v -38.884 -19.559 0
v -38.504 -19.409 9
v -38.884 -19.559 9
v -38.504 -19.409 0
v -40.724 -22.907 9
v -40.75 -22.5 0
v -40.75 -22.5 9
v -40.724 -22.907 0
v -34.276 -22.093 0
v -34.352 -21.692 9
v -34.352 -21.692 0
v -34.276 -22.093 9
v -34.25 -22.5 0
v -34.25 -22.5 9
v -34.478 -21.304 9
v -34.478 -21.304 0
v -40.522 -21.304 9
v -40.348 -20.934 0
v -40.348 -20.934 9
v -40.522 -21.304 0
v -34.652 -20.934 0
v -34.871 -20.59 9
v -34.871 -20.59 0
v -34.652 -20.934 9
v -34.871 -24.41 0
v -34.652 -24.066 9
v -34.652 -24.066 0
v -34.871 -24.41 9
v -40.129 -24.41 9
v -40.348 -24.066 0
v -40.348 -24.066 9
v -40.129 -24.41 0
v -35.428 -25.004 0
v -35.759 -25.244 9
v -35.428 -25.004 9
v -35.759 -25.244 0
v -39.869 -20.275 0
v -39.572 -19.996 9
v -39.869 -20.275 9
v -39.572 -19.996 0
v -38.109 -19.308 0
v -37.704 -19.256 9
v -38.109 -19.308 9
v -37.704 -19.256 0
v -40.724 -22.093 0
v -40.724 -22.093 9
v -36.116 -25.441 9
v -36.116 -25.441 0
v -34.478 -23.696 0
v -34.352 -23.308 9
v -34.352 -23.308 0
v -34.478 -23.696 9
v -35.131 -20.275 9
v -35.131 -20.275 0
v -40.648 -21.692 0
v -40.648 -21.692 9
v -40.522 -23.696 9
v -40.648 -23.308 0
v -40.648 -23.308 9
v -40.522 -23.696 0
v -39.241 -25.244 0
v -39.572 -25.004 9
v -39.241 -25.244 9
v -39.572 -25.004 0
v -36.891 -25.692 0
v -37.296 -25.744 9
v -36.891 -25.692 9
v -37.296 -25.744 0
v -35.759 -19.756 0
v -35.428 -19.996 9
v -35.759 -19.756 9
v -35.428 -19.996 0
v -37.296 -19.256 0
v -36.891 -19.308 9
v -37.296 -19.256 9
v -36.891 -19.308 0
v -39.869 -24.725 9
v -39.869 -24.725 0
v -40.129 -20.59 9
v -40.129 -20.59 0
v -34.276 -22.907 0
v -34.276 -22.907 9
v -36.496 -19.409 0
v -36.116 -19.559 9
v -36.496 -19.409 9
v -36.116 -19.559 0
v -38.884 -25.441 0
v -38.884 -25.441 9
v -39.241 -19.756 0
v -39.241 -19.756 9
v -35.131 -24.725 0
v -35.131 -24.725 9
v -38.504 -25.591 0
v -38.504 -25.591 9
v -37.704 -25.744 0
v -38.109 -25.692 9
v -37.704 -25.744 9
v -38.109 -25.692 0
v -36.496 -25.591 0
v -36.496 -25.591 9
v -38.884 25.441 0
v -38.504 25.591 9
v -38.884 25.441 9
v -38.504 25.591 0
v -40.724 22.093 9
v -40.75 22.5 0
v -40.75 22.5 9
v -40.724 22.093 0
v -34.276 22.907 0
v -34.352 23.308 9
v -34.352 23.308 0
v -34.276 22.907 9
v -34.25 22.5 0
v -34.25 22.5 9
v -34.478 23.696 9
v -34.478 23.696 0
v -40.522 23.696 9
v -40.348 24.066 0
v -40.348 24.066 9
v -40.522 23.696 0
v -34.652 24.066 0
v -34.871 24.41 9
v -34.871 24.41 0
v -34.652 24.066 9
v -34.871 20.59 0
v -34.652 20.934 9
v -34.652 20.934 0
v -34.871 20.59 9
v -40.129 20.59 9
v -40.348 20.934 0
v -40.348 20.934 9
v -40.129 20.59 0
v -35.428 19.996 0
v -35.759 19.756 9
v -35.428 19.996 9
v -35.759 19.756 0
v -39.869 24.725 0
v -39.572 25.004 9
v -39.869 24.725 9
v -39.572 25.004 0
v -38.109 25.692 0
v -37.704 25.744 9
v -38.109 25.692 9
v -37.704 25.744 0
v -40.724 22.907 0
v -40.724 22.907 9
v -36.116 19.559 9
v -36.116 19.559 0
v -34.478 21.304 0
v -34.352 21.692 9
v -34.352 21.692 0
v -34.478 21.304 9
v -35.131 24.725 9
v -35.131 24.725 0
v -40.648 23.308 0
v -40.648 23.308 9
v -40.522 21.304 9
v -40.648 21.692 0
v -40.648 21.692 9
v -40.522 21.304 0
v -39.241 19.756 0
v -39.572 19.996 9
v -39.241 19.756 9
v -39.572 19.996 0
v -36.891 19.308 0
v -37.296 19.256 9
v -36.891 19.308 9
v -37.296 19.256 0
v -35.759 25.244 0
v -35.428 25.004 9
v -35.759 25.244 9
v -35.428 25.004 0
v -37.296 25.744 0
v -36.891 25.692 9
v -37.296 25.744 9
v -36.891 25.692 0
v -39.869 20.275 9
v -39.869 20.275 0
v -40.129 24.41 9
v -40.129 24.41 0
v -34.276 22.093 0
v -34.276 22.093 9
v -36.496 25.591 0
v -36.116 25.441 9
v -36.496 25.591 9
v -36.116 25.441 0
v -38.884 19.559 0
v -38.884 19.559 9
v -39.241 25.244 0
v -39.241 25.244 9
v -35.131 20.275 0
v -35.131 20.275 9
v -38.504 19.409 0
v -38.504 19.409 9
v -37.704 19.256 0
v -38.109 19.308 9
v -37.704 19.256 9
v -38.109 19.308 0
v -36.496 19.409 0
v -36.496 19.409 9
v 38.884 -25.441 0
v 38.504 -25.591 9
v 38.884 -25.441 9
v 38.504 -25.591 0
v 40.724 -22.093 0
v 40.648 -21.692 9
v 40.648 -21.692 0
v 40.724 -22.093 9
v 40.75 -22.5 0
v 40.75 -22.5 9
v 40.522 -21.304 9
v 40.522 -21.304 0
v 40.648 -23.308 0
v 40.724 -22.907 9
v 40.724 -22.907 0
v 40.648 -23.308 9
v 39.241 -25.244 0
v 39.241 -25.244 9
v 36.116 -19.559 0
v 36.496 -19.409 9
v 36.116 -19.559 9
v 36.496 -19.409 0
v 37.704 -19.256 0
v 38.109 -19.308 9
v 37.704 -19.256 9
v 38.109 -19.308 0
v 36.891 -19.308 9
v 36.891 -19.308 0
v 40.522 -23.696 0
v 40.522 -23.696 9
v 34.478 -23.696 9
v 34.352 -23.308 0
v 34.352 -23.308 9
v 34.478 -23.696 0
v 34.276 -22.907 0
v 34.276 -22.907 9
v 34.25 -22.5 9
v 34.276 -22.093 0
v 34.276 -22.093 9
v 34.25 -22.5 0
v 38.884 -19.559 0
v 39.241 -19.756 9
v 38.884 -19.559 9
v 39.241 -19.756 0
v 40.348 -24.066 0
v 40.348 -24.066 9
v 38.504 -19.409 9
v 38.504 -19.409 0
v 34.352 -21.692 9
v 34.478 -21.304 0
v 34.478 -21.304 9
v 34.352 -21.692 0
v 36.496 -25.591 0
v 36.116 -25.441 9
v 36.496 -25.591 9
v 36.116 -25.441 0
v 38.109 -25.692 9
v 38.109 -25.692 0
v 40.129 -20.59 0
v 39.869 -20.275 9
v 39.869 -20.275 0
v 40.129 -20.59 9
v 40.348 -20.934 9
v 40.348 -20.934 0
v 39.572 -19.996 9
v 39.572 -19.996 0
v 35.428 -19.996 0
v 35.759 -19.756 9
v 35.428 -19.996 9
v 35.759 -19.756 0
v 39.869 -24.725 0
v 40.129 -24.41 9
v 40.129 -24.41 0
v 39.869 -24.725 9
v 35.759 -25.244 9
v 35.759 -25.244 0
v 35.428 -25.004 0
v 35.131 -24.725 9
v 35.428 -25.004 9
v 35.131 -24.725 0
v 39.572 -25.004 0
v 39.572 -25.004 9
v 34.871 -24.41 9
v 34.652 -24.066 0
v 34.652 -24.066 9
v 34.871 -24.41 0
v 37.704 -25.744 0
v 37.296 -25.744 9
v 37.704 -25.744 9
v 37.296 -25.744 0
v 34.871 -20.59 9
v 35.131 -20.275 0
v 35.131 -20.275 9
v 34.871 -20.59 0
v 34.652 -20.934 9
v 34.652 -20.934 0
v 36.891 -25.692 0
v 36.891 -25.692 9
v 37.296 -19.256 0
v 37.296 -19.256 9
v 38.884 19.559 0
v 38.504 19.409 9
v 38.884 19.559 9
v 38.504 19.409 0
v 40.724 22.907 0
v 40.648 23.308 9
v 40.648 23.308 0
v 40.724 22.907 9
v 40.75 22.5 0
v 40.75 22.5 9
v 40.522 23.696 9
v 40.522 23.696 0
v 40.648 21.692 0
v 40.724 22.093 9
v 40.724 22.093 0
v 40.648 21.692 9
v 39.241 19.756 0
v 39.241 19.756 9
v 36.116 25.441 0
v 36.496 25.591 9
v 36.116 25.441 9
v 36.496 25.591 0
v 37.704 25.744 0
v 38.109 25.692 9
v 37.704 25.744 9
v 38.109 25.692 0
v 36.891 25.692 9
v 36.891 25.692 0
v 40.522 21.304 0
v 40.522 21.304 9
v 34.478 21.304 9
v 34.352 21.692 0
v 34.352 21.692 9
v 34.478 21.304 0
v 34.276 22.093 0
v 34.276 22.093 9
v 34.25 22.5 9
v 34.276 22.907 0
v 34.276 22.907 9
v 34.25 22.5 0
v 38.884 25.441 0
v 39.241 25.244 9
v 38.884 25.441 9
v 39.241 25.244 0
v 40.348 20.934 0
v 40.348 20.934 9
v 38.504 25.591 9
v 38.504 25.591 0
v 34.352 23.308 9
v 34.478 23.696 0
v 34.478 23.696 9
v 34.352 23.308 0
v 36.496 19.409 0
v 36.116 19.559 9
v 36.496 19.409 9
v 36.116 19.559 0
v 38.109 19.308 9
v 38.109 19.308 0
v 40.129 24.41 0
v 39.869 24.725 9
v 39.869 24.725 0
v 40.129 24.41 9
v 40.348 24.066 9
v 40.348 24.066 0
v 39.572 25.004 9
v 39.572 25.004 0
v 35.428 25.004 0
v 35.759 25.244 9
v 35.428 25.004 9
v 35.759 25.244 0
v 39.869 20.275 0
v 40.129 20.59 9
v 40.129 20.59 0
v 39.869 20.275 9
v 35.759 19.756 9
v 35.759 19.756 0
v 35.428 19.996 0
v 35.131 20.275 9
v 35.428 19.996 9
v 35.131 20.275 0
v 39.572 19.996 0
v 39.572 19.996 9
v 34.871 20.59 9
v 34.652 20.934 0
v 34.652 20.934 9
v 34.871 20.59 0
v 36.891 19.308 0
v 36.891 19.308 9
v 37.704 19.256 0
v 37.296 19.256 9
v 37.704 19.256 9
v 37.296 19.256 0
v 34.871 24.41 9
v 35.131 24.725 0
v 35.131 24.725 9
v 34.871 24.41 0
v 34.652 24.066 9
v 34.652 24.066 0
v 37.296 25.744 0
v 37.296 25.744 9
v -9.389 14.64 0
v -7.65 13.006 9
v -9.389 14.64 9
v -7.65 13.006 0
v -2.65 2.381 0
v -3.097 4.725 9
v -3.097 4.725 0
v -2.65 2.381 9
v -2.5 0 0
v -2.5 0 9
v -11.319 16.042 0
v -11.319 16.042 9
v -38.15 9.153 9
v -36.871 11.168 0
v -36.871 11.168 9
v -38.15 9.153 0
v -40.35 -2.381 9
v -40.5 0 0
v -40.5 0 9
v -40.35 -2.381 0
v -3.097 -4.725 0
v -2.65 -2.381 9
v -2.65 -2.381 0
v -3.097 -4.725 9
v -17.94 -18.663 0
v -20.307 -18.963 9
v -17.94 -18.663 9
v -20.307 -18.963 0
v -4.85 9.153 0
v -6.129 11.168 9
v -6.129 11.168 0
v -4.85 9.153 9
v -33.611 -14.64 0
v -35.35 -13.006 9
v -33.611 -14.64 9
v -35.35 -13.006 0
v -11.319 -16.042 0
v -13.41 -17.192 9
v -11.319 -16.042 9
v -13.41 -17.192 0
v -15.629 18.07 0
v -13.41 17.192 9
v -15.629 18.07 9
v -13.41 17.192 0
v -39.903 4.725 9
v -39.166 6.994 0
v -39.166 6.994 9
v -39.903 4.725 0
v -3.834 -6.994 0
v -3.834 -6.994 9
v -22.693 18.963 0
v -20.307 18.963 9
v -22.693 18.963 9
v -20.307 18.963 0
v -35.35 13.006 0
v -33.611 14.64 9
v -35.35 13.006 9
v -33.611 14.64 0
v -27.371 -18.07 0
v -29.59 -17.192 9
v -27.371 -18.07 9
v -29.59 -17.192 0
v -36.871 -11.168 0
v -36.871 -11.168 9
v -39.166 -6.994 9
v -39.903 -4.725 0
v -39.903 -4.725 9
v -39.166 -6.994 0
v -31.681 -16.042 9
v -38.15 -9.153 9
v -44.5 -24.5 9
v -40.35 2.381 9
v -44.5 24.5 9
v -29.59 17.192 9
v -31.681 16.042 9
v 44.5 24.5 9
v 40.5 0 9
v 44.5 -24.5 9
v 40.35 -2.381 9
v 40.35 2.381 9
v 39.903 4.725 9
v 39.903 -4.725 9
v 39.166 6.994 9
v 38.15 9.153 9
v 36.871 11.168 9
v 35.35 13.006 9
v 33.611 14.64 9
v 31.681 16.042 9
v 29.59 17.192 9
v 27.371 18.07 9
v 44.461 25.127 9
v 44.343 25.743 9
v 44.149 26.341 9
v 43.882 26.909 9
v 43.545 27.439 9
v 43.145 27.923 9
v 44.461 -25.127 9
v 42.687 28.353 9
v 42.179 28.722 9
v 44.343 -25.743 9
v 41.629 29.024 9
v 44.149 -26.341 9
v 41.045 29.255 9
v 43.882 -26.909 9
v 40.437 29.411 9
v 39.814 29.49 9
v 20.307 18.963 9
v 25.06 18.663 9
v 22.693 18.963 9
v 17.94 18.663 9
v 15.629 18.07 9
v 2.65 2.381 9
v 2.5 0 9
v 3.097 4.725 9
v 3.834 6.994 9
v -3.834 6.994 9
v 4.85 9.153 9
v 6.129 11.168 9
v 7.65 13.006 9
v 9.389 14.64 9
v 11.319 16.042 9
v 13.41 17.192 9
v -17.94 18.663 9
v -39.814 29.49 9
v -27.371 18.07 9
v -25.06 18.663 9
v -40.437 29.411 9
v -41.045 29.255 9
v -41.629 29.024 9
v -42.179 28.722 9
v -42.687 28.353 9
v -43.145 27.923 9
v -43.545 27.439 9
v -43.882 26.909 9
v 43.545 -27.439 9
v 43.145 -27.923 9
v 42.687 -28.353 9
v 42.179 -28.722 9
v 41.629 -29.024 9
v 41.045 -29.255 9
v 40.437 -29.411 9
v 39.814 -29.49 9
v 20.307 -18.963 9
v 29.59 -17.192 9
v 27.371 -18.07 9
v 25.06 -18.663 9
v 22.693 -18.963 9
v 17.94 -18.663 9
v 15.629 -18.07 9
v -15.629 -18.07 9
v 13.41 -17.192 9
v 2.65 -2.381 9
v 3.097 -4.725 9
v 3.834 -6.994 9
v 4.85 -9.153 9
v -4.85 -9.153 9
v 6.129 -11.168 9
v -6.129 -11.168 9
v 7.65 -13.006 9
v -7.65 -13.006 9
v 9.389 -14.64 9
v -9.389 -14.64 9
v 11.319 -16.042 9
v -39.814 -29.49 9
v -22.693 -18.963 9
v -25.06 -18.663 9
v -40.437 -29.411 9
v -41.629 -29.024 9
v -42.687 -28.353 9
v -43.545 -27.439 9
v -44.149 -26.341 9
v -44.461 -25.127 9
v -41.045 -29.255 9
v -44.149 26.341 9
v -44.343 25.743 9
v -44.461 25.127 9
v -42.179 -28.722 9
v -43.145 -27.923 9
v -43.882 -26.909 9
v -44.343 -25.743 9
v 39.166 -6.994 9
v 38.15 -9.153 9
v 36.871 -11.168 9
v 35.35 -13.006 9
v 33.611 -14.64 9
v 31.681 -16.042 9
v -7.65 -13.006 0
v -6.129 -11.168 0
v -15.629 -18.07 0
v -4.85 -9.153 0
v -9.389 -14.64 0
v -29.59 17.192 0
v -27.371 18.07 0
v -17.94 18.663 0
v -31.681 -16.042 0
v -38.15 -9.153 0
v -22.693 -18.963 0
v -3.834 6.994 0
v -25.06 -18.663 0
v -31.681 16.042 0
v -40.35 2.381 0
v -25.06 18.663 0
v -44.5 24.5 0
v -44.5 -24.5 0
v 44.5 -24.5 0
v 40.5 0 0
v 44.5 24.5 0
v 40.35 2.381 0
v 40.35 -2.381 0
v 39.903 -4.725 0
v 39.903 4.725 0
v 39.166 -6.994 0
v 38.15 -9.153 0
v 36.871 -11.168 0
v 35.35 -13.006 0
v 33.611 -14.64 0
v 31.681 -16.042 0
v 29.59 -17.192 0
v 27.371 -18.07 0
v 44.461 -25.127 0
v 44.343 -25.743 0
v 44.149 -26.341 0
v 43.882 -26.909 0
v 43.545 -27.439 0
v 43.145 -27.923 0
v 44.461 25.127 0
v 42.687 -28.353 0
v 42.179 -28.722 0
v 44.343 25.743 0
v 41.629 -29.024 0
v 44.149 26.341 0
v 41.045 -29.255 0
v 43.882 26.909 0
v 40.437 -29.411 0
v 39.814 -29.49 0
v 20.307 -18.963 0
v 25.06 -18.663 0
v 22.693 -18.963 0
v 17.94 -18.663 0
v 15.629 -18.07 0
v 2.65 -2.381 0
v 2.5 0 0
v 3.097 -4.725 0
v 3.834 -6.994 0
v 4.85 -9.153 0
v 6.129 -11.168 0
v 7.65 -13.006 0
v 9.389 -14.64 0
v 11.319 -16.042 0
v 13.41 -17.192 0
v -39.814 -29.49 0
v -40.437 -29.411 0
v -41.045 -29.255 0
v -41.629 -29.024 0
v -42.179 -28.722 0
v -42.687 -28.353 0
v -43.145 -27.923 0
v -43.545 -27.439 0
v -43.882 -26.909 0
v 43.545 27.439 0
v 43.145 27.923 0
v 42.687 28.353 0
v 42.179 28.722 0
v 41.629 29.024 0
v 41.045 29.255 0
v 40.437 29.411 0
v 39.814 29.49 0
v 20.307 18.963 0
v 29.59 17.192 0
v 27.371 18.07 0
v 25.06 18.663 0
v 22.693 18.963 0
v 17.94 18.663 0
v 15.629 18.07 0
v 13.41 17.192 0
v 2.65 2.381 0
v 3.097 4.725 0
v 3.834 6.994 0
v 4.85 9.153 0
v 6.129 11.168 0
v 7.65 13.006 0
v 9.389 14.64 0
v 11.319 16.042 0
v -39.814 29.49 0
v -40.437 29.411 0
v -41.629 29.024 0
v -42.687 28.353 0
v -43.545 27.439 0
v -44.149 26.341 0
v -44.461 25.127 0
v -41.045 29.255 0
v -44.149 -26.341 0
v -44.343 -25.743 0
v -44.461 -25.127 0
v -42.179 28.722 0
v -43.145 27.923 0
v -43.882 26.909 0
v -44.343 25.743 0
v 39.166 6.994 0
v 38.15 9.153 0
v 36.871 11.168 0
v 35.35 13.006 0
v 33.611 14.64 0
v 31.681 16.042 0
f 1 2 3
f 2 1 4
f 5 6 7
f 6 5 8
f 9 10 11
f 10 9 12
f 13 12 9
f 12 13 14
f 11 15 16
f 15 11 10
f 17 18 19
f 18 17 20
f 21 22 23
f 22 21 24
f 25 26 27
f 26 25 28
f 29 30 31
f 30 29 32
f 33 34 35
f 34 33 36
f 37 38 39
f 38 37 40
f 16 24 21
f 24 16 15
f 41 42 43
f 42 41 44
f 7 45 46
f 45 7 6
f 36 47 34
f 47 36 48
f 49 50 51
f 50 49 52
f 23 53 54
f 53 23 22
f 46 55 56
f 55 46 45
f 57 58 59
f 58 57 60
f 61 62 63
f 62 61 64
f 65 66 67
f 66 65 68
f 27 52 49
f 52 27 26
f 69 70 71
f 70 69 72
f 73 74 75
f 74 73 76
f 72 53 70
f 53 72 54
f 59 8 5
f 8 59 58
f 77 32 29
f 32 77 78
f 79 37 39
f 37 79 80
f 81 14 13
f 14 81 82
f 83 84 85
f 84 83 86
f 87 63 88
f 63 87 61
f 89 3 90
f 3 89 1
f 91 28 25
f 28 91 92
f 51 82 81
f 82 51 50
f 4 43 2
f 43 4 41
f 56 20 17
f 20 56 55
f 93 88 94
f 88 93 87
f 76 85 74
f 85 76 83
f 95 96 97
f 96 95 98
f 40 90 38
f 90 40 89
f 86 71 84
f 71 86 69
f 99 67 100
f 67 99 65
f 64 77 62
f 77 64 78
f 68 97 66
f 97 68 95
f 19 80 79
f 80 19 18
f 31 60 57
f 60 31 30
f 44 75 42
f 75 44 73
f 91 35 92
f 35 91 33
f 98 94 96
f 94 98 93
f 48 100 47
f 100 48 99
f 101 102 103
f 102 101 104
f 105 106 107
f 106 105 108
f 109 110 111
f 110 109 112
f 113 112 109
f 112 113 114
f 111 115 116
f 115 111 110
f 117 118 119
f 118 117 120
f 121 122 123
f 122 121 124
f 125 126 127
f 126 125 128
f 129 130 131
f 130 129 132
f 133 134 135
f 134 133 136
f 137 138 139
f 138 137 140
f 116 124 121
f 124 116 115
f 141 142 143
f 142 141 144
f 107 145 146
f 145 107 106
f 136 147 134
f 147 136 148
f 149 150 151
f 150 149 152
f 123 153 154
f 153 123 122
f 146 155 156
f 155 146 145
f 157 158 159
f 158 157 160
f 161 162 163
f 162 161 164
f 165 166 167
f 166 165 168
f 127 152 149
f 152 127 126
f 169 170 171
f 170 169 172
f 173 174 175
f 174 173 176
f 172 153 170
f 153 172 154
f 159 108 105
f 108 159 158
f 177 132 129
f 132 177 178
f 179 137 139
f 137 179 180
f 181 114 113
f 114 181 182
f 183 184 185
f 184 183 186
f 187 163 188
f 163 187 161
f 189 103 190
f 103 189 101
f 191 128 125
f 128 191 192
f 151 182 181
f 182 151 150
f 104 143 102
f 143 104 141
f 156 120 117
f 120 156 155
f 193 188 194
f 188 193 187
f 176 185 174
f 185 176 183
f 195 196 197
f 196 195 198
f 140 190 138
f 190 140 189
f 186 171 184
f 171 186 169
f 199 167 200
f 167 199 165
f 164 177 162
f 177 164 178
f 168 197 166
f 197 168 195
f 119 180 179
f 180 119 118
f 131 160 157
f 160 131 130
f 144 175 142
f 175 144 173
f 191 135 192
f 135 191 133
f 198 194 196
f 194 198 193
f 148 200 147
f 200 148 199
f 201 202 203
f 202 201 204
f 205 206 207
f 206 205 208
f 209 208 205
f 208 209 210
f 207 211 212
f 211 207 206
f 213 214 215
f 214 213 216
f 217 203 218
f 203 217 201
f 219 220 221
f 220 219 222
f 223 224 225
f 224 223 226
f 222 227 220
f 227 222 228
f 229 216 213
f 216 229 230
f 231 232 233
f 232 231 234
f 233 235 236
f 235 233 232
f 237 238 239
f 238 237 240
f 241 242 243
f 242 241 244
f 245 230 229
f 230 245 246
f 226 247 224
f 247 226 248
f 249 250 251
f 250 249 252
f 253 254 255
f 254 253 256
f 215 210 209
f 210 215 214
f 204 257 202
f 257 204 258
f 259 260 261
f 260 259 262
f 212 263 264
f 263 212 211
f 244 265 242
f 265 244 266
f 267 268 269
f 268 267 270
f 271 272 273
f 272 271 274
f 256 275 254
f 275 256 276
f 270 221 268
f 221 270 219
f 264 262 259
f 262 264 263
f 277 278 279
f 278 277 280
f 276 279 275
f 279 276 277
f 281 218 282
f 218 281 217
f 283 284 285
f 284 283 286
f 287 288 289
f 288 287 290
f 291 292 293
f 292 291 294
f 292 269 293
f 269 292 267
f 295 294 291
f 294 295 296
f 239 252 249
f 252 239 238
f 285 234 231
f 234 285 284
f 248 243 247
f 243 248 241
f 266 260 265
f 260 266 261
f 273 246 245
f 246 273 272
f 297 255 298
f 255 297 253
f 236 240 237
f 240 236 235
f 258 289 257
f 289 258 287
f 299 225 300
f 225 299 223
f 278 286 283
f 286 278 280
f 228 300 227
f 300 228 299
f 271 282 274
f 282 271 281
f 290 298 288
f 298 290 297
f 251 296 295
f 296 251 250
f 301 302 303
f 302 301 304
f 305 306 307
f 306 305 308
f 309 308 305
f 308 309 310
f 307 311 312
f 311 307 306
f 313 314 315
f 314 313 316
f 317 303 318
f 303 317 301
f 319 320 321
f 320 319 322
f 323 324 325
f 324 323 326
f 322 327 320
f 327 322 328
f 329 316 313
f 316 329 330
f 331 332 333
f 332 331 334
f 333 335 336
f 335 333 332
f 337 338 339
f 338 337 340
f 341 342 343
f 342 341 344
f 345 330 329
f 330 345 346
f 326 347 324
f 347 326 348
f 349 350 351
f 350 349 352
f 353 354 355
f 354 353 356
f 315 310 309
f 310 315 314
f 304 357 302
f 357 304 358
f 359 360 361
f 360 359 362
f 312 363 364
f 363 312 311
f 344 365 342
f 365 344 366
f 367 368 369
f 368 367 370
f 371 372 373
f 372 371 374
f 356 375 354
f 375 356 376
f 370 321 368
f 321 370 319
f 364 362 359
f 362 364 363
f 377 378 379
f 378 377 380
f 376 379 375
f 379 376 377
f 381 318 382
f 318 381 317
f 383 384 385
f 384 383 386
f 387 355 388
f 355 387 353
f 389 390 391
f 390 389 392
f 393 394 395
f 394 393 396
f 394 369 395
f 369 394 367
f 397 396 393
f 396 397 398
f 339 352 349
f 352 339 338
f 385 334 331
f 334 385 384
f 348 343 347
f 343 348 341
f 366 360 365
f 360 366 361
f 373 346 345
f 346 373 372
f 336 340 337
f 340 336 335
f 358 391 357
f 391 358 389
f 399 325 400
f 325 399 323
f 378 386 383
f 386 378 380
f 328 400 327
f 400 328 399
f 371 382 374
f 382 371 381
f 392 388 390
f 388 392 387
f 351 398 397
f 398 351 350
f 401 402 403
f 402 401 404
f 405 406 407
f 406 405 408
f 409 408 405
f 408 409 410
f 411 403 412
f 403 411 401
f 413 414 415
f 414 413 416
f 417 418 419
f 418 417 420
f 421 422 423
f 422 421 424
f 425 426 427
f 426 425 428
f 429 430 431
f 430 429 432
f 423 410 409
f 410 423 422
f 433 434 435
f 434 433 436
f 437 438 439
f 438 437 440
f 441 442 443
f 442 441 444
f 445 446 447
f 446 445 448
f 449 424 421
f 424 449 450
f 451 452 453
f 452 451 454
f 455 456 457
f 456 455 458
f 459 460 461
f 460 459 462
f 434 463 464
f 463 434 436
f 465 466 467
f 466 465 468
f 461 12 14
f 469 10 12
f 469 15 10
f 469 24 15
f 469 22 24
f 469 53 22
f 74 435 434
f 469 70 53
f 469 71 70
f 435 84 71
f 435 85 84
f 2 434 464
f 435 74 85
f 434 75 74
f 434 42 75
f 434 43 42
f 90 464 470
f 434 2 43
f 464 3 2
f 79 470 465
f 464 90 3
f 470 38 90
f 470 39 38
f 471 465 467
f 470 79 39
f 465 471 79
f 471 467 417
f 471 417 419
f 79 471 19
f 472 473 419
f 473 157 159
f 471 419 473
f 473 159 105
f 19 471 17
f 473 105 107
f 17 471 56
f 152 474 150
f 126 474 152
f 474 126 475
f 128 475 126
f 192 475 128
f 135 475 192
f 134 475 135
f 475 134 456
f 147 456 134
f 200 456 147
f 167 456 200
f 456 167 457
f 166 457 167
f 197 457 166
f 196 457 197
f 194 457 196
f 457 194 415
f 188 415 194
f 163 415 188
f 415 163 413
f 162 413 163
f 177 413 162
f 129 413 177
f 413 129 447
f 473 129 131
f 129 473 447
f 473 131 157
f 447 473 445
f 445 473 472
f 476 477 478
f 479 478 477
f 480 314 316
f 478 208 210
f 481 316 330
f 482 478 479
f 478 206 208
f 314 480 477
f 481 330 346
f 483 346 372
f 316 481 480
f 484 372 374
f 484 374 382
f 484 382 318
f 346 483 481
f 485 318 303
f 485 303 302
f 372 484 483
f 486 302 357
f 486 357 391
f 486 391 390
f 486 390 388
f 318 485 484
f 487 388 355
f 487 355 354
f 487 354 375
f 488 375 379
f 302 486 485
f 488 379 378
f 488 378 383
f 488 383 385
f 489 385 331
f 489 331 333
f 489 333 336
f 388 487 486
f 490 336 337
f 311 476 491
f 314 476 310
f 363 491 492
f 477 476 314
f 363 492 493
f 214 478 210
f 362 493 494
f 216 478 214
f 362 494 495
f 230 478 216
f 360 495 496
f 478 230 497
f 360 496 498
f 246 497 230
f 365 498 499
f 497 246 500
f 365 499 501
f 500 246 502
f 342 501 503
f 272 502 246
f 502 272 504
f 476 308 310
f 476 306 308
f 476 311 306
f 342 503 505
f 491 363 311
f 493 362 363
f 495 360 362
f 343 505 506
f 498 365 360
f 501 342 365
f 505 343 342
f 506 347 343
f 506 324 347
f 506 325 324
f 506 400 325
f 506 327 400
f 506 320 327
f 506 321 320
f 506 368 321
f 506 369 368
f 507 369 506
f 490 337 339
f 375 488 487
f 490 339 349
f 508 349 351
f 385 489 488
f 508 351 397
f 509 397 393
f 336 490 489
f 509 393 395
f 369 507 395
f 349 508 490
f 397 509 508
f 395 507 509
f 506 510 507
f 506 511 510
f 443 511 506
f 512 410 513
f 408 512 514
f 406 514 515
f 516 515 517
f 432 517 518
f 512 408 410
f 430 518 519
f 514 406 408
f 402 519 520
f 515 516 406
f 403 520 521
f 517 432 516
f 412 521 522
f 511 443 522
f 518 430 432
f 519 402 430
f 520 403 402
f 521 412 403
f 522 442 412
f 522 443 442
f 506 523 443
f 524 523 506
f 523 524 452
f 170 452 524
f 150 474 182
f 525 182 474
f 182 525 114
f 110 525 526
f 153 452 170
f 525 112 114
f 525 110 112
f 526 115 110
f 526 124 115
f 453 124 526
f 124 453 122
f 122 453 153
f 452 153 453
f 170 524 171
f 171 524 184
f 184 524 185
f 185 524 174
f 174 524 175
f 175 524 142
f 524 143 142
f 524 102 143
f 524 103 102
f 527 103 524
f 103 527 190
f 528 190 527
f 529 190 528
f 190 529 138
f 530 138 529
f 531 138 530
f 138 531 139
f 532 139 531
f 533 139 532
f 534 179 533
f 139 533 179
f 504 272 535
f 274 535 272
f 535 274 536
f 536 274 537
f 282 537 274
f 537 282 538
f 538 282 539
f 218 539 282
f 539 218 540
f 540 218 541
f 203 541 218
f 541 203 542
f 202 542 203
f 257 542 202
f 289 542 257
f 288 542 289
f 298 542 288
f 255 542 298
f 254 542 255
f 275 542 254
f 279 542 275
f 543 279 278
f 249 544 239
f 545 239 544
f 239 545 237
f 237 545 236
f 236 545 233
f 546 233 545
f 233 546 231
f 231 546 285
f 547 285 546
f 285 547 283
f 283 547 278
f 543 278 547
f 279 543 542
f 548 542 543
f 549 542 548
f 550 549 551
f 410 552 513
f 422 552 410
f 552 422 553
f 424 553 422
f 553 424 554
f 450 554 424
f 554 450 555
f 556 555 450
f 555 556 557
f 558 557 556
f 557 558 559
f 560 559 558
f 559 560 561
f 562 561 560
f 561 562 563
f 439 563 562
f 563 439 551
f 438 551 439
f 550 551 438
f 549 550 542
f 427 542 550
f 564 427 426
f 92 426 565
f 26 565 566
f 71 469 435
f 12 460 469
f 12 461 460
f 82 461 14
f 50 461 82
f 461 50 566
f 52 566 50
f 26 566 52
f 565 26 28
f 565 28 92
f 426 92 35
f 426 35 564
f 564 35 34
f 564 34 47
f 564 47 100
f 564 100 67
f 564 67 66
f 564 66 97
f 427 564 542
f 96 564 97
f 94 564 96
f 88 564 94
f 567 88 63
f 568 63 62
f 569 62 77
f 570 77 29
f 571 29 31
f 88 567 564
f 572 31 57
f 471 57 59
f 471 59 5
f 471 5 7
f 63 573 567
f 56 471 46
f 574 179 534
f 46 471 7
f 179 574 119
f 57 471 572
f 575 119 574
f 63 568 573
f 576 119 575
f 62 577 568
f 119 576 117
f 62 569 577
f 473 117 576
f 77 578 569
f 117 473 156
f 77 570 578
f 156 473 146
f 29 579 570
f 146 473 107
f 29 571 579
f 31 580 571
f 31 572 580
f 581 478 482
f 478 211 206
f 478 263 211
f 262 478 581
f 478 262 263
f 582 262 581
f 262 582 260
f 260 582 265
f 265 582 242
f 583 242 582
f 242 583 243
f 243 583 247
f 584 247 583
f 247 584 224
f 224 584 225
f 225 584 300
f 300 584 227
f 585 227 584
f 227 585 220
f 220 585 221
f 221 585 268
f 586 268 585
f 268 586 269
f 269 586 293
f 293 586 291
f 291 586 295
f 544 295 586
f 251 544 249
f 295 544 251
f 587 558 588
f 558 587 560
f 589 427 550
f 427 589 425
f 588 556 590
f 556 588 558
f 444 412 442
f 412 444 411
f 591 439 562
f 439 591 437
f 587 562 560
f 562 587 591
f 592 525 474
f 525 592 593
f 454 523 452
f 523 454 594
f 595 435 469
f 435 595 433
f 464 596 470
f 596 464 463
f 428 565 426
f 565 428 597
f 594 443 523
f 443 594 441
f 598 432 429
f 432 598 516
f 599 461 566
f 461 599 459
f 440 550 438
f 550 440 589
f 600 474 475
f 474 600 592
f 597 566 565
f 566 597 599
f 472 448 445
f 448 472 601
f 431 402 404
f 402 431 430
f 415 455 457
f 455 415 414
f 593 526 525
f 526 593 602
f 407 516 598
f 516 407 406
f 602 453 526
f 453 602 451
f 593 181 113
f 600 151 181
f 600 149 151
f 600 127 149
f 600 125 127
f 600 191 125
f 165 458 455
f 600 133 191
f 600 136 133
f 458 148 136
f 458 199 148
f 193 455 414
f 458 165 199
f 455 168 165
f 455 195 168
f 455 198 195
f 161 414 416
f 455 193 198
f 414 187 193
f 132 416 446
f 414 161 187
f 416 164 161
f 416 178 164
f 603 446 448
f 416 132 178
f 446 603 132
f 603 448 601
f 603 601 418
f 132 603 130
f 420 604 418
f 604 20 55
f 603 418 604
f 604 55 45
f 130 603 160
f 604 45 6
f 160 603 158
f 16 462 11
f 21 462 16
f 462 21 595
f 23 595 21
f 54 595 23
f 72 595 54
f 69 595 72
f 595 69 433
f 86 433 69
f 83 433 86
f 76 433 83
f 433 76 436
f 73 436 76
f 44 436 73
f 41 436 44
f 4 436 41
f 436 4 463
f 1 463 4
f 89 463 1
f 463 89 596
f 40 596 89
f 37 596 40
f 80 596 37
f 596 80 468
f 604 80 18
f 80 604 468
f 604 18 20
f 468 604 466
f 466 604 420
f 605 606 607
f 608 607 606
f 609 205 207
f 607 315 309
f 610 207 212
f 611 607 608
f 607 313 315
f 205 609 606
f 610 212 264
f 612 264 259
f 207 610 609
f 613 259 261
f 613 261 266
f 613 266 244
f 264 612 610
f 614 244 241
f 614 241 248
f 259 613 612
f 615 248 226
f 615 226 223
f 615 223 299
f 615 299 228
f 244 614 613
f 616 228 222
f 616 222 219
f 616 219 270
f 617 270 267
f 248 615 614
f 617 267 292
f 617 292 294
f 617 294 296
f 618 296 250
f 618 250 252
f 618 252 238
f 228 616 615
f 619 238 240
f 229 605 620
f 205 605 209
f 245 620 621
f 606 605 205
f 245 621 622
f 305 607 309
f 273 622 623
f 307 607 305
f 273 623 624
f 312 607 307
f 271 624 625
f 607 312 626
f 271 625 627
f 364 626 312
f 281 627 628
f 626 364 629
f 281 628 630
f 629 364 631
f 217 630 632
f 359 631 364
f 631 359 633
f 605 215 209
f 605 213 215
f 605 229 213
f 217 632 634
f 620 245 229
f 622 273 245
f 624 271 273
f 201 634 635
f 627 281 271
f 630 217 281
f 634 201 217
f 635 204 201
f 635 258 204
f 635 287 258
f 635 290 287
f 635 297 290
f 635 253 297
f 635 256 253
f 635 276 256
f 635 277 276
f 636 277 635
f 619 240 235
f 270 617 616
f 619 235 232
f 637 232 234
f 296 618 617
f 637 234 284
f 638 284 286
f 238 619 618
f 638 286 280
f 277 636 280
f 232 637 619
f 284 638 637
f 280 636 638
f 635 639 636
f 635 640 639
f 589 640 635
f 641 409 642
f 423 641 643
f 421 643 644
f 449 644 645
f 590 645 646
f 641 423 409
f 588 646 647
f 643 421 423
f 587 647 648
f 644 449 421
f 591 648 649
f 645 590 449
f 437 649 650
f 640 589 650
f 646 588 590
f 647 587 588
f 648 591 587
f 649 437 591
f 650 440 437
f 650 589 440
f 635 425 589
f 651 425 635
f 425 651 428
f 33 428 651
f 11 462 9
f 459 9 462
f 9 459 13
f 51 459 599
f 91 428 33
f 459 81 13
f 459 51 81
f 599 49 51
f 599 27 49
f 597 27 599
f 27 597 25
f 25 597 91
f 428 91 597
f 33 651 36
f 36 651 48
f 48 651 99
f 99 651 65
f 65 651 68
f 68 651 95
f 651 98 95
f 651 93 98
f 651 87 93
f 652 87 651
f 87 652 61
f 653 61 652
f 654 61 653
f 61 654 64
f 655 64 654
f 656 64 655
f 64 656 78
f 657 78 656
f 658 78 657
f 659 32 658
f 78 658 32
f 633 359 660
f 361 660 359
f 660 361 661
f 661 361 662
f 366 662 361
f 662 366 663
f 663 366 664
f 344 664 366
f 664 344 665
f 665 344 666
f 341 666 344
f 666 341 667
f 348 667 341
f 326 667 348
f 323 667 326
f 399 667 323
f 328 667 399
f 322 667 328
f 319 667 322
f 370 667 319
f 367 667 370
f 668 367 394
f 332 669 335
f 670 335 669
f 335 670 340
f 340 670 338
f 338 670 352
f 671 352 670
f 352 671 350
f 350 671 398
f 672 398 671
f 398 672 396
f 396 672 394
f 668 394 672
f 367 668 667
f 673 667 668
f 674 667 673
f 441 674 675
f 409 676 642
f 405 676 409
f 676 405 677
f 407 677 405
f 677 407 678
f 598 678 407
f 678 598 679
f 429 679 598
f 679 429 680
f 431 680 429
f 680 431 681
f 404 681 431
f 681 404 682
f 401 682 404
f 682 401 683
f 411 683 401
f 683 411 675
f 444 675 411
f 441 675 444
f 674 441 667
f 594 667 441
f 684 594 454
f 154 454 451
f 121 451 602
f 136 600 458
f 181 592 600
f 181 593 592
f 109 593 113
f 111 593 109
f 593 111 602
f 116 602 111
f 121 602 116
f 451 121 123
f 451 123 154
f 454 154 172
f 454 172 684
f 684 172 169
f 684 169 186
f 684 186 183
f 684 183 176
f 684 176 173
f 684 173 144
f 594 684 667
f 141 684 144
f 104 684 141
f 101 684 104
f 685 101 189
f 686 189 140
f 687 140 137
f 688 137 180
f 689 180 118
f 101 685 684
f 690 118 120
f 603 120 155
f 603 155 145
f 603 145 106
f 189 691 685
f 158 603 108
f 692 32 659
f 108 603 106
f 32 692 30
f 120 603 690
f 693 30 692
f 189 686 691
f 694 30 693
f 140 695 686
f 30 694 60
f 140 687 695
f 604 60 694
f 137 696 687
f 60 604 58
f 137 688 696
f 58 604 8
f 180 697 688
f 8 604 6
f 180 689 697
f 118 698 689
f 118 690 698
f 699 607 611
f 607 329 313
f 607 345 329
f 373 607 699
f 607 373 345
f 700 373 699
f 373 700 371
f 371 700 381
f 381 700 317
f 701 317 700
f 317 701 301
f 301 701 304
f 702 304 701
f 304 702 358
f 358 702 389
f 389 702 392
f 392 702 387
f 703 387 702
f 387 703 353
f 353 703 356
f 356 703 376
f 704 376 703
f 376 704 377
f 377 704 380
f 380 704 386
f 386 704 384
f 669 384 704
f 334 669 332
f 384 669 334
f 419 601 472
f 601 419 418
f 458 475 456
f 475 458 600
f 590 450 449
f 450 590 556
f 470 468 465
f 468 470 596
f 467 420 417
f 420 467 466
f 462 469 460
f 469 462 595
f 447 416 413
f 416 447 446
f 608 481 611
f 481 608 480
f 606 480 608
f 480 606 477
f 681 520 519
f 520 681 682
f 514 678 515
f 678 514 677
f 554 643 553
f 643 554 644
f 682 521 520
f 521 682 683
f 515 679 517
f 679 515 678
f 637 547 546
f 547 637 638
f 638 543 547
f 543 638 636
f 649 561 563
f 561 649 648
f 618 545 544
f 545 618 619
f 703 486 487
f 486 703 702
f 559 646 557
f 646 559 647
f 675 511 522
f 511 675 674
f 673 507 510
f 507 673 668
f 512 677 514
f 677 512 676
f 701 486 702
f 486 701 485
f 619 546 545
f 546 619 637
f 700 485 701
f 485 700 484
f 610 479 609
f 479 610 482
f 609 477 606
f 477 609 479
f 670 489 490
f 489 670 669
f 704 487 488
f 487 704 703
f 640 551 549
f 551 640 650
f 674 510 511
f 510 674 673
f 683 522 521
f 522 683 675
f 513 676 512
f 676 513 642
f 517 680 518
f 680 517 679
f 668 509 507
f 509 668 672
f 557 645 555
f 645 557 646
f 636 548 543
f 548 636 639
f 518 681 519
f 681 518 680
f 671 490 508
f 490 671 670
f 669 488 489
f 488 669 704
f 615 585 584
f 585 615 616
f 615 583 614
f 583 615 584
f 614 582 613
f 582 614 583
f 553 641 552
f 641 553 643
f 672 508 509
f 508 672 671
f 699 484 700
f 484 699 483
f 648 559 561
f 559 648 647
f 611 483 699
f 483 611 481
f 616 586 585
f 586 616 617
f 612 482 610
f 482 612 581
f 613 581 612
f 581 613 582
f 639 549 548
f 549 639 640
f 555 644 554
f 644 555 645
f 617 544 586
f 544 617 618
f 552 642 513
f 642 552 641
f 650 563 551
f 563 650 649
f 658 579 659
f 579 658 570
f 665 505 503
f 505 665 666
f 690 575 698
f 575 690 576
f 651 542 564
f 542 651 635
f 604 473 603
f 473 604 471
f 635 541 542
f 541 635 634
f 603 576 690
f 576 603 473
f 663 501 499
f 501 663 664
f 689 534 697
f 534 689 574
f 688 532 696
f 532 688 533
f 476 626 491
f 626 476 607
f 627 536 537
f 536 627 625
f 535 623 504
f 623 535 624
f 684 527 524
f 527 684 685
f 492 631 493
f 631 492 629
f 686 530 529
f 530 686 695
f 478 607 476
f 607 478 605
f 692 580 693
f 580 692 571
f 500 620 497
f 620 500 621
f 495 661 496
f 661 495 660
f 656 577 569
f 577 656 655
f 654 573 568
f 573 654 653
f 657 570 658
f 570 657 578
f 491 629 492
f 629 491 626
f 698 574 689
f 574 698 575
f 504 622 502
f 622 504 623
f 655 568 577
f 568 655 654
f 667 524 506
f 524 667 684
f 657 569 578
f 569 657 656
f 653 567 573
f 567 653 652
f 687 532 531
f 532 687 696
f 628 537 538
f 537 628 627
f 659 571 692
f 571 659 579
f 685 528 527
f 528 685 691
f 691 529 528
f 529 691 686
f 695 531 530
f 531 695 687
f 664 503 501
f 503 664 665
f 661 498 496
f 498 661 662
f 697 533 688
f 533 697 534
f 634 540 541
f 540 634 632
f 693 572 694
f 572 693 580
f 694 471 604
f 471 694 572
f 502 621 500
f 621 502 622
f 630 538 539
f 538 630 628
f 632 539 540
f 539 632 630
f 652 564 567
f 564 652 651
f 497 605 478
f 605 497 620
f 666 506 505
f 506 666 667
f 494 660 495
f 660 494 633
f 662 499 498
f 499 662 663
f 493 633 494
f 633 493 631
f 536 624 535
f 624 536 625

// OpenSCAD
$fn = 50;


difference() {
	union() {
		hull() {
			translate(v = [-39.5000000000, 24.5000000000, 0]) {
				cylinder(h = 9, r = 5);
			}
			translate(v = [39.5000000000, 24.5000000000, 0]) {
				cylinder(h = 9, r = 5);
			}
			translate(v = [-39.5000000000, -24.5000000000, 0]) {
				cylinder(h = 9, r = 5);
			}
			translate(v = [39.5000000000, -24.5000000000, 0]) {
				cylinder(h = 9, r = 5);
			}
		}
	}
	union() {
		#translate(v = [-37.5000000000, -22.5000000000, -100.0000000000]) {
			cylinder(h = 200, r = 3.2500000000);
		}
		#translate(v = [-37.5000000000, 22.5000000000, -100.0000000000]) {
			cylinder(h = 200, r = 3.2500000000);
		}
		#translate(v = [37.5000000000, -22.5000000000, -100.0000000000]) {
			cylinder(h = 200, r = 3.2500000000);
		}
		#translate(v = [37.5000000000, 22.5000000000, -100.0000000000]) {
			cylinder(h = 200, r = 3.2500000000);
		}
		#translate(v = [-21.5000000000, 0, 0]) {
			cylinder(h = 9, r = 19.0000000000);
		}
		#translate(v = [21.5000000000, 0, 0]) {
			cylinder(h = 9, r = 19.0000000000);
		}
	}
}
